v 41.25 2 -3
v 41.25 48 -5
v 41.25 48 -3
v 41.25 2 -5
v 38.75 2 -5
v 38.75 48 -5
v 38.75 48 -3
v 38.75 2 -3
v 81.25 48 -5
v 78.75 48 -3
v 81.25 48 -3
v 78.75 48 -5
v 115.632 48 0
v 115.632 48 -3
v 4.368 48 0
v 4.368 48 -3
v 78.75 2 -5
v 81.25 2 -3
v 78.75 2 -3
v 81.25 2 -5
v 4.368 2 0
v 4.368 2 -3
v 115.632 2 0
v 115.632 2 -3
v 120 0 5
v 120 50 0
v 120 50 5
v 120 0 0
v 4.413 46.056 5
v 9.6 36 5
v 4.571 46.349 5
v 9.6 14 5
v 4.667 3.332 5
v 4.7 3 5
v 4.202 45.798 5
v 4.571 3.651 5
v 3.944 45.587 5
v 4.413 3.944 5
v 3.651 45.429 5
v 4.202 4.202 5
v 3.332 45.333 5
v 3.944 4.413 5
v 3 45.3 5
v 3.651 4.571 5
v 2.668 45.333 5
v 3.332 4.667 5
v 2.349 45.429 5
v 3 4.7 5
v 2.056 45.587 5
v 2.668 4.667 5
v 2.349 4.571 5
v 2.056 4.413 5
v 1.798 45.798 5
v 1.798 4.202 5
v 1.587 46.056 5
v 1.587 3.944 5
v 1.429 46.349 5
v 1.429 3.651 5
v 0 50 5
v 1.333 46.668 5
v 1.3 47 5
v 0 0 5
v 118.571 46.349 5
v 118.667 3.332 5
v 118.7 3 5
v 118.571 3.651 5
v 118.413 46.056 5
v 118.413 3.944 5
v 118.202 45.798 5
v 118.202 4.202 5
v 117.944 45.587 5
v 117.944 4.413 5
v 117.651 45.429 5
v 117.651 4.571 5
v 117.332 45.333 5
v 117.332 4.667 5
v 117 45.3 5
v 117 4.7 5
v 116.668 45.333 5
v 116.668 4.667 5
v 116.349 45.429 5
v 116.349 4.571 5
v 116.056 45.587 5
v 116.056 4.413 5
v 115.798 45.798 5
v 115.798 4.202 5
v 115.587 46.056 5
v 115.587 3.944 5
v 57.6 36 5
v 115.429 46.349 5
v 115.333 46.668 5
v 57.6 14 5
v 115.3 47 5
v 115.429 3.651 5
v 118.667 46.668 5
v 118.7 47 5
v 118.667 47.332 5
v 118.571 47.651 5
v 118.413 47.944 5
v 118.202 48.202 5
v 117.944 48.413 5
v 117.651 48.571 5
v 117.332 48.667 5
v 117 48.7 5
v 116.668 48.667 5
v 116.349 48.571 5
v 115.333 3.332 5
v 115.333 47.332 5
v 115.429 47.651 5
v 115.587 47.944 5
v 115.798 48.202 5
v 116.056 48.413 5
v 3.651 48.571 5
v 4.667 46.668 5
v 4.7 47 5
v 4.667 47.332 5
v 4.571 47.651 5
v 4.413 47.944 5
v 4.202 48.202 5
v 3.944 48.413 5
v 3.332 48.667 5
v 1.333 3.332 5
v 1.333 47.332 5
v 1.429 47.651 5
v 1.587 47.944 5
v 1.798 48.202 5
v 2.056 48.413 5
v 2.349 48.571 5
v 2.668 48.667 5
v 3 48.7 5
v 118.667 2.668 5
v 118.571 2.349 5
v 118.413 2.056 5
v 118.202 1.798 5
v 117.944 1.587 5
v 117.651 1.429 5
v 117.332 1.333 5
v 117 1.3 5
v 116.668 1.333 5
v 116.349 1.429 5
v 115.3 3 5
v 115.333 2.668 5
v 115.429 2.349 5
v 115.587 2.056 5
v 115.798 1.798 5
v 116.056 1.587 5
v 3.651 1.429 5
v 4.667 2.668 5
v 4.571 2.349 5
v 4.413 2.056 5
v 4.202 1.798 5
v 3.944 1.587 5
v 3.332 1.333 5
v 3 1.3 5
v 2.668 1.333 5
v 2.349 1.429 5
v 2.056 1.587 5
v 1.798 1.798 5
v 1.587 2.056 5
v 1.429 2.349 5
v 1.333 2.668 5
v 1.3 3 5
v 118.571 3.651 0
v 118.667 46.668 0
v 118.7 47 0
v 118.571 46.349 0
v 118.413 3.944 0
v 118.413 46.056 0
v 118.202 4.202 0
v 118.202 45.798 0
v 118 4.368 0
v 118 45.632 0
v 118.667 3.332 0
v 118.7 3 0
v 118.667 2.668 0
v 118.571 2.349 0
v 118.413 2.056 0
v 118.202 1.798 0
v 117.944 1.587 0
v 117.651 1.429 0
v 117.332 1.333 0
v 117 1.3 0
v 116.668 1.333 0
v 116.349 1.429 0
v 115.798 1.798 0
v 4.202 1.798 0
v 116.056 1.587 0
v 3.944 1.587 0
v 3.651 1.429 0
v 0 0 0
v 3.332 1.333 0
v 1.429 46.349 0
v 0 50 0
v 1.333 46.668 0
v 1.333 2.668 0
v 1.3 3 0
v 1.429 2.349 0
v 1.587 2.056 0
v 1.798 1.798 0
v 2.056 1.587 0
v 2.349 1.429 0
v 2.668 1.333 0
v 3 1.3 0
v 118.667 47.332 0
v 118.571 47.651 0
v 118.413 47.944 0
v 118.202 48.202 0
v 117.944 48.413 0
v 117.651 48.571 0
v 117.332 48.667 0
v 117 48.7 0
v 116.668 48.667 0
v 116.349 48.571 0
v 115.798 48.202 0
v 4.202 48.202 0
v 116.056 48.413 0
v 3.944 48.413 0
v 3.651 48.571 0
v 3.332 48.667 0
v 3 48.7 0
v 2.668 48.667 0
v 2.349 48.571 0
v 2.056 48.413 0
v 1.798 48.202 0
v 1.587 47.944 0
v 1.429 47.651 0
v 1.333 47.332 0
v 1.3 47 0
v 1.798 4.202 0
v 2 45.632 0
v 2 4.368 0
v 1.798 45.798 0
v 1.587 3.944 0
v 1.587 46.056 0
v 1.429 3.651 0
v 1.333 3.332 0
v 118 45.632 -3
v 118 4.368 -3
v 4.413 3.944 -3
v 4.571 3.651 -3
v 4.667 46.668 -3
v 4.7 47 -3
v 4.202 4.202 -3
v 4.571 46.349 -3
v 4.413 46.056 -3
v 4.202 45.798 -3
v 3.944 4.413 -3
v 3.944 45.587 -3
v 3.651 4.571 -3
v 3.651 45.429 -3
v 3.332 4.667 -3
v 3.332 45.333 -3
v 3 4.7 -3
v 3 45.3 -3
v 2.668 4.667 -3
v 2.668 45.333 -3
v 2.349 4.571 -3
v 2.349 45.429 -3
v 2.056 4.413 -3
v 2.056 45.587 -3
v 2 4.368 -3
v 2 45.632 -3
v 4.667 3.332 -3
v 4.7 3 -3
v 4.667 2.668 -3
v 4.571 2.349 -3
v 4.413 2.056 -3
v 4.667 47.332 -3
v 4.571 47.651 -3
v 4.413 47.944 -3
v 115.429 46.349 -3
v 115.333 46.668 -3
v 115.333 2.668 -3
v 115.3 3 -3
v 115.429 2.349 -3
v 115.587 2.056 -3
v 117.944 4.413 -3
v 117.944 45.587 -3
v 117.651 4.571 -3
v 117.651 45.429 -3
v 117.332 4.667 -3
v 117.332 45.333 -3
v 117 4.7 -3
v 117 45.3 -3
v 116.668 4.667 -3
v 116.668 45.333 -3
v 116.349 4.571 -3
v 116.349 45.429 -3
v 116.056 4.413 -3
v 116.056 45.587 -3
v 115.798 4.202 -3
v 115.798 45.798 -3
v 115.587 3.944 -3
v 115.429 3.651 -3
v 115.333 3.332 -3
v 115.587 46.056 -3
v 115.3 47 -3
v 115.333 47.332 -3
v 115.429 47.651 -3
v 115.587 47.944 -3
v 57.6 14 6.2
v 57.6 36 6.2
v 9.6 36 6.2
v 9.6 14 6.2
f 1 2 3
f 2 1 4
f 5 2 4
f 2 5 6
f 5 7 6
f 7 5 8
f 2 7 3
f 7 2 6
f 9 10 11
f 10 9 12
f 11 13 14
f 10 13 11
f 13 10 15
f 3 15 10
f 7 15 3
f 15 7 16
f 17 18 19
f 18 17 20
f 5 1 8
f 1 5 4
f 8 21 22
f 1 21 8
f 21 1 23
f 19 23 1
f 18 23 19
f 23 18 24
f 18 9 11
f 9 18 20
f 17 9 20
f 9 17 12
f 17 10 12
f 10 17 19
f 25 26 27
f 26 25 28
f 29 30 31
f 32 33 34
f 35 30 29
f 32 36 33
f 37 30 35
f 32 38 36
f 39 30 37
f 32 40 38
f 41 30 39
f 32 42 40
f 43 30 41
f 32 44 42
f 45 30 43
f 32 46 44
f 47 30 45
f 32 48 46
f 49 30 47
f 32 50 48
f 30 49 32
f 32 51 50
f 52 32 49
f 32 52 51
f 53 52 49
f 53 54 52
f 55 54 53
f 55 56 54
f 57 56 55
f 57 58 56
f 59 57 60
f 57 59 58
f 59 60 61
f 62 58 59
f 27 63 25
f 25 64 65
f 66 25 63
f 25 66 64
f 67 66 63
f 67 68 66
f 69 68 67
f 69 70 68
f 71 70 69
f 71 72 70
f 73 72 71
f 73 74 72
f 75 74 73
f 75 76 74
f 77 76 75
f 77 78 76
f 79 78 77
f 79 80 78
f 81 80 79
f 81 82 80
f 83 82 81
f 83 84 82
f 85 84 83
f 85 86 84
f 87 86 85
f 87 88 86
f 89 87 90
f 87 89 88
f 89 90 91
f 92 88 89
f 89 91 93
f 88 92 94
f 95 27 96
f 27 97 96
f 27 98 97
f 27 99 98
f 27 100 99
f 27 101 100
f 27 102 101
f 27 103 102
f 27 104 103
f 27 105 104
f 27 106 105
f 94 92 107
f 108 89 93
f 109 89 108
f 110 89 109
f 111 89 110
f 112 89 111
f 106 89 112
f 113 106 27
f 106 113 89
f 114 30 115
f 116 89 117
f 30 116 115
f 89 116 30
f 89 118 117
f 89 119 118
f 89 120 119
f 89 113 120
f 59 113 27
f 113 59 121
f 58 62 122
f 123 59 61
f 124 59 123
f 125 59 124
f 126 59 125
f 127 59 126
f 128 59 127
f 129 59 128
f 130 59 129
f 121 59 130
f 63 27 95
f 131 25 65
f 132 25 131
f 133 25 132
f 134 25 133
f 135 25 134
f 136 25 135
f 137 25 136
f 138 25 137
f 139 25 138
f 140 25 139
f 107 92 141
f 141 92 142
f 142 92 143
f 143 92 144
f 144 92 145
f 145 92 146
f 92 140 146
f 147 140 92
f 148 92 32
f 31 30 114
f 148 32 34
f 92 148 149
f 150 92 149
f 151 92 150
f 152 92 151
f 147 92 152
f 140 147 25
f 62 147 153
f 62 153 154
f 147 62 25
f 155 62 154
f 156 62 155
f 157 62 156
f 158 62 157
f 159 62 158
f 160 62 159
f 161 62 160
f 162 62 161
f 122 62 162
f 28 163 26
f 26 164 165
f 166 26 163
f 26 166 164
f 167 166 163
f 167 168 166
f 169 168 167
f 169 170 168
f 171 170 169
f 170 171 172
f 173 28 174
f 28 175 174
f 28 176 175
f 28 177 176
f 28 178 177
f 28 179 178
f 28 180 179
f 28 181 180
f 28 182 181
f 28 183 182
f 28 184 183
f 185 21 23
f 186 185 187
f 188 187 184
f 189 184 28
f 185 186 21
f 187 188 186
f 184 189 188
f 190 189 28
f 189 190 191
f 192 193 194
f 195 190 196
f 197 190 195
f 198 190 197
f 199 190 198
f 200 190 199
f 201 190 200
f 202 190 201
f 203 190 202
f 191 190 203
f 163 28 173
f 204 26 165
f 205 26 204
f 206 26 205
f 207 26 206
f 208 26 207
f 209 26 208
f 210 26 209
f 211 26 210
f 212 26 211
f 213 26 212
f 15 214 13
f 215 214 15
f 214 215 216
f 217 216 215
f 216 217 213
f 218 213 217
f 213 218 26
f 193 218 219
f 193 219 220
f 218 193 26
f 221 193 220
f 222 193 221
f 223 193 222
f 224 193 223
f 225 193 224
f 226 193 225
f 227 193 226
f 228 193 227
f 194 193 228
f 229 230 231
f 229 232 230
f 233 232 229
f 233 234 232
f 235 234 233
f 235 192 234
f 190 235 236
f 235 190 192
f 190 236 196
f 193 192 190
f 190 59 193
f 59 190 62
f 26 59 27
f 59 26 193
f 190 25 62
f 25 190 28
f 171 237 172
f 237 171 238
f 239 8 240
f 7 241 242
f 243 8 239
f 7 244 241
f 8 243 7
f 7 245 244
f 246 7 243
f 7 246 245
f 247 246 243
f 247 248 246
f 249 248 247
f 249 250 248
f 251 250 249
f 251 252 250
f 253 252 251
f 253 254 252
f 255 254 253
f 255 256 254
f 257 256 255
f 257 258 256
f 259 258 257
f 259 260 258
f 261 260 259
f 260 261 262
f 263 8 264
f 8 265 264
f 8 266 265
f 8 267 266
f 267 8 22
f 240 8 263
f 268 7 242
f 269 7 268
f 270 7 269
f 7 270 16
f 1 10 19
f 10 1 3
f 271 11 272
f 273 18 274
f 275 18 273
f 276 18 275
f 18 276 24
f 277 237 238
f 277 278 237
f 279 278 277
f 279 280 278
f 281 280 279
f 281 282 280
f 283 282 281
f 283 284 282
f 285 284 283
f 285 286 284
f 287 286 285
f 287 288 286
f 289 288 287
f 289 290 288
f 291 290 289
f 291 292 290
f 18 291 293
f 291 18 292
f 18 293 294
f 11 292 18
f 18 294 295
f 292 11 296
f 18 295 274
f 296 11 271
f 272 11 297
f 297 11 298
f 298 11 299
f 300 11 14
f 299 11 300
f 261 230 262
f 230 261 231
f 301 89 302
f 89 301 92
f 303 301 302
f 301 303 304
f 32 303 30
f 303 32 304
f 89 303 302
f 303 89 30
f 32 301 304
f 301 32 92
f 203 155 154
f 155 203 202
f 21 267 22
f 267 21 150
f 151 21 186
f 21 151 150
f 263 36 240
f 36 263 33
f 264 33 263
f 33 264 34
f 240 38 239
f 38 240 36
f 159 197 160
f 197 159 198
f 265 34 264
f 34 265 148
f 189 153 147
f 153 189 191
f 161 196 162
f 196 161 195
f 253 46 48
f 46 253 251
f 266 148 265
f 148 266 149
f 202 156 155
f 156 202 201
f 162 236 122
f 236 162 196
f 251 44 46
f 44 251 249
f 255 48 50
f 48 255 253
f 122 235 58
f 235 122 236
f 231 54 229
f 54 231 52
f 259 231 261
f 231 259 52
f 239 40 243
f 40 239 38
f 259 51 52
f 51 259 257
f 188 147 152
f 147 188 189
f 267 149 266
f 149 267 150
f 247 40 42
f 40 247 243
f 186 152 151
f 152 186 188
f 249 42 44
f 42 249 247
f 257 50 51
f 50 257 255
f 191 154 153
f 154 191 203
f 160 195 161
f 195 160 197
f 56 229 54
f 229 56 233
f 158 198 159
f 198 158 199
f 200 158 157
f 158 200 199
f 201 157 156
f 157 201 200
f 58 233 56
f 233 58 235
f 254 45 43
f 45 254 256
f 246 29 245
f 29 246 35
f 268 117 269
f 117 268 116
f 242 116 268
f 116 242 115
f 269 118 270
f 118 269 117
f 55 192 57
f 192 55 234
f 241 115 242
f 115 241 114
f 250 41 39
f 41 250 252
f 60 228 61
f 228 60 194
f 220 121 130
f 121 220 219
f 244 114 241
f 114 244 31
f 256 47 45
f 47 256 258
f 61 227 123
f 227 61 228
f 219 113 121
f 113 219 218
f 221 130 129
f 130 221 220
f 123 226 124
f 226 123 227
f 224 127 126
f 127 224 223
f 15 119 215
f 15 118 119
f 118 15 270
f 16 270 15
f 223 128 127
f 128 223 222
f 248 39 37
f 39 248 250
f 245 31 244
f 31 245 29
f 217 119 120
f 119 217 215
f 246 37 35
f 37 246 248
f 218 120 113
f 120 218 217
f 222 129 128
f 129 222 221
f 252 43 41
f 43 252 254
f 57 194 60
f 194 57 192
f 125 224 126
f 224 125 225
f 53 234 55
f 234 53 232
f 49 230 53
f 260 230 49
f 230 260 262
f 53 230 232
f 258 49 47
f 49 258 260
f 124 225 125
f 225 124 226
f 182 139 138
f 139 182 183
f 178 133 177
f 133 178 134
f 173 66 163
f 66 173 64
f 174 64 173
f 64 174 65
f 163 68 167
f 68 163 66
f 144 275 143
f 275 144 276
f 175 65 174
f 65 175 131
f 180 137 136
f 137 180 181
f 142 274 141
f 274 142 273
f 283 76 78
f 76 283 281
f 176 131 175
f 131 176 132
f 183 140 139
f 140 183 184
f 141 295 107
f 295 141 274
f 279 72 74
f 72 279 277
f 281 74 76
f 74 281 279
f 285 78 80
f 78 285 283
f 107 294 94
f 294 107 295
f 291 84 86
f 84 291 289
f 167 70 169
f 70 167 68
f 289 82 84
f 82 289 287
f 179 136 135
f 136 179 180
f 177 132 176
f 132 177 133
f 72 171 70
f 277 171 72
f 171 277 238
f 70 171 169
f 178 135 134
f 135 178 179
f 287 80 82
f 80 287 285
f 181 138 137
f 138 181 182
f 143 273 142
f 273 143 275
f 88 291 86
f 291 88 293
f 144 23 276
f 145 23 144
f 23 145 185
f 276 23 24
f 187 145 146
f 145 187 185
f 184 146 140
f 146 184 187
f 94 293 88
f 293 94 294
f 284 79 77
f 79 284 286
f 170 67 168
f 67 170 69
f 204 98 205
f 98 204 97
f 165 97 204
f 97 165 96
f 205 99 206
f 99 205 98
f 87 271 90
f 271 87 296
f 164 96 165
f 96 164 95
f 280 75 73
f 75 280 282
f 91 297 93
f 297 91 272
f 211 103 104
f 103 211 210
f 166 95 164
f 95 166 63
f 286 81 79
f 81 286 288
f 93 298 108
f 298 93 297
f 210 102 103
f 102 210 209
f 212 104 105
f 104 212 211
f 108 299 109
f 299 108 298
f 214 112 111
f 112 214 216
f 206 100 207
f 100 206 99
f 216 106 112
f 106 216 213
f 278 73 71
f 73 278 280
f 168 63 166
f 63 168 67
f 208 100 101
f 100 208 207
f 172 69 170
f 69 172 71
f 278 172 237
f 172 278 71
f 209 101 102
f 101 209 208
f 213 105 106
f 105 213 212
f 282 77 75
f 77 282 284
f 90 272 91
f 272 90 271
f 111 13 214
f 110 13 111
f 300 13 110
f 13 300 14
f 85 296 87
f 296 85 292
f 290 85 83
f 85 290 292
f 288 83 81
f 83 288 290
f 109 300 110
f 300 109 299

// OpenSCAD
$fn = 32;

// ----------------------------------------------------------------------
// Enclosure lid: 120 x 50 x 5 mm, 4 bolt holes
// ----------------------------------------------------------------------

// --- parameters (mm) ---
length = 120;             // lid length, X
width = 50;               // lid width, Y
plate_t = 5;              // lid plate thickness
bolt_d = 3.4;             // bolt clearance
boss_lip = 3;             // bolt hole inset from the corner
sink = 1;                 // overlap of the lip and ribs into the plate
lip_h = 4;                // lip height below the plate
lip_wall = 2;             // lip wall thickness
rib_n = 2;                // stiffening ribs
rib_t = 2.5;              // rib thickness
rib_h = 6;                // rib height below the plate
label_h = 1.2;            // raised marking pad

module plate() {
  cube([length, width, plate_t]);
  /* lip that drops into the housing opening, sunk into the plate */
  translate([lip_wall, lip_wall, -lip_h + sink]) cube([length - 2 * lip_wall, width - 2 * lip_wall, lip_h]);
  /* stiffening ribs under the plate */
  for (i = [1 : rib_n]) translate([length * i / (rib_n + 1) - rib_t / 2, lip_wall, -rib_h + sink]) cube([rib_t, width - 2 * lip_wall, rib_h]);
  /* raised marking pad on top, sunk 1 mm into the plate */
  translate([length * 0.08, width * 0.28, plate_t - 1]) cube([length * 0.4, width * 0.44, label_h + 1]);
}

difference() {
  plate();
  /* bolt pattern matching the corner bosses */
  for (sx = [0, 1]) for (sy = [0, 1])
    translate([sx * (length - 2 * boss_lip) + boss_lip, sy * (width - 2 * boss_lip) + boss_lip, -lip_h - 1])
      cylinder(h = plate_t + lip_h + 2, d = bolt_d);
}
